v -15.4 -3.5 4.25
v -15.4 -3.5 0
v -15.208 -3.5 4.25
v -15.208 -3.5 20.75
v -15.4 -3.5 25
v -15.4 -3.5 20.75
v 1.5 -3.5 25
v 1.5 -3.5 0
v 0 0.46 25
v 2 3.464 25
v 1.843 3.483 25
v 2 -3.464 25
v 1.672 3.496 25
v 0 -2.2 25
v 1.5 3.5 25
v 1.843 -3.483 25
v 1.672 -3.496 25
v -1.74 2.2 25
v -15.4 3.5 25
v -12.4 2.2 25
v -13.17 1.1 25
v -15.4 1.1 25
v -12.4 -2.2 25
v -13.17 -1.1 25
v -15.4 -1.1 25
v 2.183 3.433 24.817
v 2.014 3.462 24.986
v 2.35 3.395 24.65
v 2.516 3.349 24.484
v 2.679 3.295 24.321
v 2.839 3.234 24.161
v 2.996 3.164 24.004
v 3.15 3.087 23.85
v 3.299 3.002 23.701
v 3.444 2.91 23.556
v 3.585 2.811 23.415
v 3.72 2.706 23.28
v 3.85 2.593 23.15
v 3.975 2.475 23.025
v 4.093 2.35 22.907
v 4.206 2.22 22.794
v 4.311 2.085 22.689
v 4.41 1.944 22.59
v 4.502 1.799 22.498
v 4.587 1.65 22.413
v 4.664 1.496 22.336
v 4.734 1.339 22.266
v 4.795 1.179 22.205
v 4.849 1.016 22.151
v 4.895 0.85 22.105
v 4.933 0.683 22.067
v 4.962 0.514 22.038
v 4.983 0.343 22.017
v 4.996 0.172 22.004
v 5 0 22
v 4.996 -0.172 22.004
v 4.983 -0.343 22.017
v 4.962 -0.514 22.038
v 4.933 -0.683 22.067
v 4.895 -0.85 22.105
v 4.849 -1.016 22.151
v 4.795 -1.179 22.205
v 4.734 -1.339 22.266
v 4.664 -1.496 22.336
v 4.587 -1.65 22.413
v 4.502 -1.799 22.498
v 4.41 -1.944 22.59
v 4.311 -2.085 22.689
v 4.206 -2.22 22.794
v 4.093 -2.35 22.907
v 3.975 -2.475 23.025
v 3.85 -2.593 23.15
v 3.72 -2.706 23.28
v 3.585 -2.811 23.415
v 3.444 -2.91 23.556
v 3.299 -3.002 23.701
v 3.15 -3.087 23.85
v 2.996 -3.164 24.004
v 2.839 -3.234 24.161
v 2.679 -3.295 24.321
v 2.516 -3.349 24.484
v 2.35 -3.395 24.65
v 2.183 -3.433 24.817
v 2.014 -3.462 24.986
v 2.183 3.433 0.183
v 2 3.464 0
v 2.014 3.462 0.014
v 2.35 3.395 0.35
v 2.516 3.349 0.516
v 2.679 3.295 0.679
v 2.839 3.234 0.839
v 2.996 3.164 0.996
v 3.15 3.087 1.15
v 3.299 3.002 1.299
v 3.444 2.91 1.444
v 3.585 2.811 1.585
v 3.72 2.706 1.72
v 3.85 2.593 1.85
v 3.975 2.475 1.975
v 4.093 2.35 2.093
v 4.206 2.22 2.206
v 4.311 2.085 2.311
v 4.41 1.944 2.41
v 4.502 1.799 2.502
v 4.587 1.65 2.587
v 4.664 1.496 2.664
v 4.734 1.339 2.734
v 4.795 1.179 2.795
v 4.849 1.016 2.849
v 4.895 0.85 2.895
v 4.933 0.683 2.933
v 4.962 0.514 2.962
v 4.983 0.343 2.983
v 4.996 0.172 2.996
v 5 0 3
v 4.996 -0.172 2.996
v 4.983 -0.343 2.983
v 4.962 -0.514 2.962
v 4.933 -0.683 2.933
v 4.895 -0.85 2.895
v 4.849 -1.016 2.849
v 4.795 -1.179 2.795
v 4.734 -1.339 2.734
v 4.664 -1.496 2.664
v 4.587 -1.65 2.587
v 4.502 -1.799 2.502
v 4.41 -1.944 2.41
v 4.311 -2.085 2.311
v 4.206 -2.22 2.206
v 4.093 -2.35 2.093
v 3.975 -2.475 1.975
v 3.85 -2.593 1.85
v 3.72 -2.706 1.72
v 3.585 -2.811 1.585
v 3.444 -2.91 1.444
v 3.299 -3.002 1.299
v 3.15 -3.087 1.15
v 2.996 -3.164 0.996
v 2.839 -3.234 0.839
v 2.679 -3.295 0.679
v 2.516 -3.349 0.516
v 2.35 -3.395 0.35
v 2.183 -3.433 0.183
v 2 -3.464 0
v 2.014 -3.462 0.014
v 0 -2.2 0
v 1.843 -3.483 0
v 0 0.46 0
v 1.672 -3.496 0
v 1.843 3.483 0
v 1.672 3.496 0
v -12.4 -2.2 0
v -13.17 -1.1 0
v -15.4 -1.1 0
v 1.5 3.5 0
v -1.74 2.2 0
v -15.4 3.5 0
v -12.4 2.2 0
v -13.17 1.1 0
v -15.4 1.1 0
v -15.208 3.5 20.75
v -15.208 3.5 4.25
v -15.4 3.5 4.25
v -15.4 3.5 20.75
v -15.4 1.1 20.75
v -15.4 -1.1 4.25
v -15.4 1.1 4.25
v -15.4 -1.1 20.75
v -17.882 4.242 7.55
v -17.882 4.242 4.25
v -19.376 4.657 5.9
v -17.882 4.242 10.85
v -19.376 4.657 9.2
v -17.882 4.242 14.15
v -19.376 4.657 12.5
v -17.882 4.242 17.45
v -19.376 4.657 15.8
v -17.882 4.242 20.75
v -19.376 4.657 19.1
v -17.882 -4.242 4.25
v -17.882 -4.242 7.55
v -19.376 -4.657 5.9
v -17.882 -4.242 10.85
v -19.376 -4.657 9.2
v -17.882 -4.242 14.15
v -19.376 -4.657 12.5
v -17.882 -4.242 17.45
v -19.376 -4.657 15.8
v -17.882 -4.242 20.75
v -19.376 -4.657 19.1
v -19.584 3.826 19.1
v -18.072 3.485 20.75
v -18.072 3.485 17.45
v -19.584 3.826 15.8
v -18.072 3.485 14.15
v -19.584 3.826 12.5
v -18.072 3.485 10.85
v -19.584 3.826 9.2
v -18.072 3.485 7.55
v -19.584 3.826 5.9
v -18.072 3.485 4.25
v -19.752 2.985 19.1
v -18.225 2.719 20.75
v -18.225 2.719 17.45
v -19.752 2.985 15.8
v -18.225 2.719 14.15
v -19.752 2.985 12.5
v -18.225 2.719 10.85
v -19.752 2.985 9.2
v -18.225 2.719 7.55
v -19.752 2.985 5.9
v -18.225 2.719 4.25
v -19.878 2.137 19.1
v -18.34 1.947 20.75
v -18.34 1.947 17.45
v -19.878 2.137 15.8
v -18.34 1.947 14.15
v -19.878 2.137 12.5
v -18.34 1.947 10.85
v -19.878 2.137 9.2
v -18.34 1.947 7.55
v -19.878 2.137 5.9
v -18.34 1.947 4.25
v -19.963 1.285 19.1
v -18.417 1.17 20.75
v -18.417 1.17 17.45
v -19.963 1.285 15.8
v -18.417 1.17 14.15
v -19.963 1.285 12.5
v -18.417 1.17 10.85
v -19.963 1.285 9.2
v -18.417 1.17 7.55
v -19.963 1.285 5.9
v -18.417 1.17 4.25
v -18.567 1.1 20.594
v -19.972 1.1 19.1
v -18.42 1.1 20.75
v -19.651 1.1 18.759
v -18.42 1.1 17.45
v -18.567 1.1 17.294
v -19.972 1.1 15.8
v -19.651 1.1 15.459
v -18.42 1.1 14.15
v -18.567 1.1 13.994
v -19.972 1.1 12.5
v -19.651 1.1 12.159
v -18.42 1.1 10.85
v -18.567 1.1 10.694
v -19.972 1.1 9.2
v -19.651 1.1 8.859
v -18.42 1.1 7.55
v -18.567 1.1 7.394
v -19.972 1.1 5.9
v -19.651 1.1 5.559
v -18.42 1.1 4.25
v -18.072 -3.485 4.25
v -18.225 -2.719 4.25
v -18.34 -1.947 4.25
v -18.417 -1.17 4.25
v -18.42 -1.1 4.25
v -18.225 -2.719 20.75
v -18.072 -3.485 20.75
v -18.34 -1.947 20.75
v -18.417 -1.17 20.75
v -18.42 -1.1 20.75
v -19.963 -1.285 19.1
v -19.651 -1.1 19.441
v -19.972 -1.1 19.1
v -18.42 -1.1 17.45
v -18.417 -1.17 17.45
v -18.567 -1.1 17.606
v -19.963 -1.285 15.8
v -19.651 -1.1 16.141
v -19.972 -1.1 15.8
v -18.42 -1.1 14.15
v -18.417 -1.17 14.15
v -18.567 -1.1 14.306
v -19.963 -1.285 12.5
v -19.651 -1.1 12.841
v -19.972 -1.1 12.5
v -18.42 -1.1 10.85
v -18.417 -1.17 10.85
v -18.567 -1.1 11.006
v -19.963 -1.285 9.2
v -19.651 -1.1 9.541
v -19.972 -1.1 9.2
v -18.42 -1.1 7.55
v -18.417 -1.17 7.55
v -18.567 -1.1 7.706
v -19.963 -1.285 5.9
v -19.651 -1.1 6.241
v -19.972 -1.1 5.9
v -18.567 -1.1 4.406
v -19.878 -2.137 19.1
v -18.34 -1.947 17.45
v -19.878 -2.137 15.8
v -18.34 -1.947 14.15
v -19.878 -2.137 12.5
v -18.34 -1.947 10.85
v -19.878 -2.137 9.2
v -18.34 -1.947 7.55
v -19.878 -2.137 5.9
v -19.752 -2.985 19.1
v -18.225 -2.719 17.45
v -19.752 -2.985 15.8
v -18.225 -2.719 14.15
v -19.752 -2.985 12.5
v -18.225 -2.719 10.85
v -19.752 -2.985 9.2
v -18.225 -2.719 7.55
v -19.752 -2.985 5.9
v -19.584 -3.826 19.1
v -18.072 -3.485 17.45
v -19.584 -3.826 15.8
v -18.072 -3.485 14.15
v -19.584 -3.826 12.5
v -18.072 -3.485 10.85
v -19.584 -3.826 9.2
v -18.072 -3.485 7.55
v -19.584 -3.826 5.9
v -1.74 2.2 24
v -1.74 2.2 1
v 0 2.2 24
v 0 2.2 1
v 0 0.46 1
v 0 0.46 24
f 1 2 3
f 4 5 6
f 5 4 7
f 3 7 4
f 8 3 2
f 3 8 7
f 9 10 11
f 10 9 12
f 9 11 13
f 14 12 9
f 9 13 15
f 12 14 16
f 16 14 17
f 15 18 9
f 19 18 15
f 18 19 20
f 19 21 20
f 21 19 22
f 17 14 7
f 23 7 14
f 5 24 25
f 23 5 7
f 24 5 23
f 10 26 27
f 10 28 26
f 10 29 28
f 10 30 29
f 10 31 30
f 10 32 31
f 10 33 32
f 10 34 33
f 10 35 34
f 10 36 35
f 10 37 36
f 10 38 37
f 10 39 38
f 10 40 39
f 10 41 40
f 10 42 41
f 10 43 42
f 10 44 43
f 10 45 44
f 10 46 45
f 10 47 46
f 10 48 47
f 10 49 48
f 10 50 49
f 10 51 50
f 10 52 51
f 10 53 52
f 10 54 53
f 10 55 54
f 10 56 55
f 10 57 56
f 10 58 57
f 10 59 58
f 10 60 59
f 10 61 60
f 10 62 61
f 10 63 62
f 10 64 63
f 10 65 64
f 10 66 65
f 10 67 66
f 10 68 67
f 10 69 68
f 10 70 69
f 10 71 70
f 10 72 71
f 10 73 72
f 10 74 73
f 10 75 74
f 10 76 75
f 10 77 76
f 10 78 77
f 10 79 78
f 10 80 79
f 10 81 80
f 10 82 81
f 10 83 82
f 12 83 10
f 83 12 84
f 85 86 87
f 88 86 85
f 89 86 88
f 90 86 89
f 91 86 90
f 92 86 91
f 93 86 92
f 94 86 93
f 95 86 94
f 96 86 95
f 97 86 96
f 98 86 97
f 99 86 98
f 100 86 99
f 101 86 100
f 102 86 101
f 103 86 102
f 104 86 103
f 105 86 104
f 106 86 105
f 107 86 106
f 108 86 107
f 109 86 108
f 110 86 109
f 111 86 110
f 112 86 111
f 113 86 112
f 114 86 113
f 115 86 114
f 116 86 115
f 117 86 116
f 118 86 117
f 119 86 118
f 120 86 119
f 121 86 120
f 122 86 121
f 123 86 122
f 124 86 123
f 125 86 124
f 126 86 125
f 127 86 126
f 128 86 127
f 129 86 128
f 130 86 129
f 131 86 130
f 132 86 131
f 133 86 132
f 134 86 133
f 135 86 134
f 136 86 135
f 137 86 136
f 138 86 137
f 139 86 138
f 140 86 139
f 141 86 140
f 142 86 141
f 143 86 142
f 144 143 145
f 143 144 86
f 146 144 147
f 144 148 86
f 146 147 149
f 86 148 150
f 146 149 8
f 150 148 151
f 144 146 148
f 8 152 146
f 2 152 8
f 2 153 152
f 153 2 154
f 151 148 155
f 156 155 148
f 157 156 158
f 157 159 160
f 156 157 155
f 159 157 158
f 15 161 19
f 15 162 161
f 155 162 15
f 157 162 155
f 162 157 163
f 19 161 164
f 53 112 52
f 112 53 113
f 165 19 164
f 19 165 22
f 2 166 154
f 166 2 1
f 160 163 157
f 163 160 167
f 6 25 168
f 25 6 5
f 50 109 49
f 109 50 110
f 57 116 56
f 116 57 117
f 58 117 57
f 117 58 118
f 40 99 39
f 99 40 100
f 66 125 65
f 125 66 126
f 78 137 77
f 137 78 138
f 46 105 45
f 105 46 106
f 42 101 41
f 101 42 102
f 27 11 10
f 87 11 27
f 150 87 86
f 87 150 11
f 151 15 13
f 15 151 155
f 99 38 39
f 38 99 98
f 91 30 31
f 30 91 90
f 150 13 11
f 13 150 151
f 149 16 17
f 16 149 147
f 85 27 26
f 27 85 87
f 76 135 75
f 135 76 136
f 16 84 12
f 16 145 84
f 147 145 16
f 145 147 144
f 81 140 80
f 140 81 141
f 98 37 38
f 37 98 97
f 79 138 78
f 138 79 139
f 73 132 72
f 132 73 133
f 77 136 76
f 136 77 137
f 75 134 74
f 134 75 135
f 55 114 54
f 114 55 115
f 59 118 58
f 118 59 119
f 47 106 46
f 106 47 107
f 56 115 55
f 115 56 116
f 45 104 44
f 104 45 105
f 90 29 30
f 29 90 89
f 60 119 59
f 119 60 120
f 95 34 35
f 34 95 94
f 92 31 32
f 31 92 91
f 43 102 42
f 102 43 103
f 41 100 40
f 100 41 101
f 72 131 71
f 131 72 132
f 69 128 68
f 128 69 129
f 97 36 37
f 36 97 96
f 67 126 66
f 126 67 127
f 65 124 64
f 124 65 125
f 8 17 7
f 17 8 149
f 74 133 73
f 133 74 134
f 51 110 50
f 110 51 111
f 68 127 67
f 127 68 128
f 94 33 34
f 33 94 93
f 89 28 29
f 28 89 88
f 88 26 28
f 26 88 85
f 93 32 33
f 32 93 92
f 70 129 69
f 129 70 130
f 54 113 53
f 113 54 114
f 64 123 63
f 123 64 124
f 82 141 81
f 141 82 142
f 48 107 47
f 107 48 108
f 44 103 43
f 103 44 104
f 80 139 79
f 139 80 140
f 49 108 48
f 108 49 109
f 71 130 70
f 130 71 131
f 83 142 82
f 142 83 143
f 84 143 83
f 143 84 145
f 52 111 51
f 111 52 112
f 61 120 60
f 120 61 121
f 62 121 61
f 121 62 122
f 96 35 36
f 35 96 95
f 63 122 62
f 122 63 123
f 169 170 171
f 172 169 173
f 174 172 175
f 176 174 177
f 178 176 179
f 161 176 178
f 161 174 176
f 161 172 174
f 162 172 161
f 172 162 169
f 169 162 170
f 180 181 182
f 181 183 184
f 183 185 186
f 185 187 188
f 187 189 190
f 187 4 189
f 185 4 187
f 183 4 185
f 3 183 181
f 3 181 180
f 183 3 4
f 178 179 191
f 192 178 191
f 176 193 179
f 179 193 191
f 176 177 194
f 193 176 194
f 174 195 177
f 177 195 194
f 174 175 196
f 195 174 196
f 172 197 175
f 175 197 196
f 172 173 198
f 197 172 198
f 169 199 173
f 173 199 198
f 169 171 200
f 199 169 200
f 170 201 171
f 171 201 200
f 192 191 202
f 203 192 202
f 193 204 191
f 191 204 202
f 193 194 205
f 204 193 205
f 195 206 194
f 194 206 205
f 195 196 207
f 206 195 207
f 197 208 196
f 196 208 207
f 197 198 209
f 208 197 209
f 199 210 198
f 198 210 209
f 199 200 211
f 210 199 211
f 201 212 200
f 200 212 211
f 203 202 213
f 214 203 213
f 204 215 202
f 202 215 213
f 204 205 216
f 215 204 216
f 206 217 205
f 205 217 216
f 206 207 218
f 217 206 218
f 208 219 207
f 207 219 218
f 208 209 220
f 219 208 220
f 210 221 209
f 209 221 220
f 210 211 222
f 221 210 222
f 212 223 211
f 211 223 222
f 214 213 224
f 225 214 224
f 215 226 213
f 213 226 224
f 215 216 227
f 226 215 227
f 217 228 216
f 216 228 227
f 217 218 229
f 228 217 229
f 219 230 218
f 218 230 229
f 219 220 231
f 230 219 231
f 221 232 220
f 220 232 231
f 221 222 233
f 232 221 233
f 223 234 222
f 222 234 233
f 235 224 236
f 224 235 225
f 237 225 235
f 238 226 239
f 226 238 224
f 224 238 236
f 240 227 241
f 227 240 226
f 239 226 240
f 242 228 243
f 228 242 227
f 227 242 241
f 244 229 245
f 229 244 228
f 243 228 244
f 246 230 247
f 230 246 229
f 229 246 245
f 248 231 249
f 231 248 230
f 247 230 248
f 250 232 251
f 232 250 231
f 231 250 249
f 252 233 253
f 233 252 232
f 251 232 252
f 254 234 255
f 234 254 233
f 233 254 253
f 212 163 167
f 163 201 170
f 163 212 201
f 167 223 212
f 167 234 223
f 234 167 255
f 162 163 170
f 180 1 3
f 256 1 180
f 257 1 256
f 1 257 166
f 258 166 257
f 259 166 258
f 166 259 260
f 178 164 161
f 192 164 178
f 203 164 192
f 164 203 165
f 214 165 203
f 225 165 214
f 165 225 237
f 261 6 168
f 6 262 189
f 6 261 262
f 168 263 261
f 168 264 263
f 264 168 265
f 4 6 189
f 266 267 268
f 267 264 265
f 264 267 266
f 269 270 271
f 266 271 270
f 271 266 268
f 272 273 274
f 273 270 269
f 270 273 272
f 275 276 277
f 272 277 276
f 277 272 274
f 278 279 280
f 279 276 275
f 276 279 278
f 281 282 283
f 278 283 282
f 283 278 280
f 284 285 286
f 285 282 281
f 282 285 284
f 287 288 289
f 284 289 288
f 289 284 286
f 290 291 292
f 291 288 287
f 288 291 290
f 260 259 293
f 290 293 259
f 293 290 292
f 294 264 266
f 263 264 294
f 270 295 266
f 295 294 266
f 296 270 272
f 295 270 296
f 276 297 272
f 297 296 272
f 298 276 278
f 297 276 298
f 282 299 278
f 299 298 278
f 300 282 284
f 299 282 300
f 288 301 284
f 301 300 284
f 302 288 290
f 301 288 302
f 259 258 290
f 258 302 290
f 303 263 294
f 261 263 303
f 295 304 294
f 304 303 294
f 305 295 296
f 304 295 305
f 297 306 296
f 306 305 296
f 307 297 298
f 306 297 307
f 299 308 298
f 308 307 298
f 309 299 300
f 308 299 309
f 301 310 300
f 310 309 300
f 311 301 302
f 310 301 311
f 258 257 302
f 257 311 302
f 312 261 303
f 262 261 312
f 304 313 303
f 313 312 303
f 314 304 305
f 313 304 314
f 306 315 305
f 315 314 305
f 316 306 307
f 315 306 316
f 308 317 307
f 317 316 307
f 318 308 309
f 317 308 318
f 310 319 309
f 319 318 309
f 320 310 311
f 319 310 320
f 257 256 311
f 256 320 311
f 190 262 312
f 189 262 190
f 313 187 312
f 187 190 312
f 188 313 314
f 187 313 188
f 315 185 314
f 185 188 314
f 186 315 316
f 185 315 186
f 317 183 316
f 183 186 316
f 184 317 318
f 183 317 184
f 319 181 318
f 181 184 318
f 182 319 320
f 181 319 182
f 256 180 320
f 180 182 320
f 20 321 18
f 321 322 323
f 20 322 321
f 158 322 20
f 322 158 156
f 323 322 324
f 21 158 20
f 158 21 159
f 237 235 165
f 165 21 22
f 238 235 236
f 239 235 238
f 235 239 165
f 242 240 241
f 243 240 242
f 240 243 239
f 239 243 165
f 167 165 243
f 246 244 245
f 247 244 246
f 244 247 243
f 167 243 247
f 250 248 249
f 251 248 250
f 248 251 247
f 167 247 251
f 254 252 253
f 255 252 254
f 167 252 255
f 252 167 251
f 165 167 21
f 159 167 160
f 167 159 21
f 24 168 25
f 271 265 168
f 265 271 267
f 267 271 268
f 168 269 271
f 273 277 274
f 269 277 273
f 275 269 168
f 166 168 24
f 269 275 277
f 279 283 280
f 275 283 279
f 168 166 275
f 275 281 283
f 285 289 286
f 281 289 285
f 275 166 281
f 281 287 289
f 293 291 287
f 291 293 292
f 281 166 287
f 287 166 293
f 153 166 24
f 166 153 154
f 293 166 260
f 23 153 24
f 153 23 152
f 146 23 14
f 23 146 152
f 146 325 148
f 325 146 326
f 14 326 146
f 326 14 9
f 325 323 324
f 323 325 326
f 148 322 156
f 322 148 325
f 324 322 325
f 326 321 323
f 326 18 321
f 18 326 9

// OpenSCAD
// file: SideTab.scad
//<params>
left = true;
// oem is 35.5
tabWidth = 39.5;
tabThickness = 8.4;
vaneThickness = 4.45;
vaneTolerance = 0.2;
extraBehindVane = 3;
extraInFrontOfVane = 1.5;
vaneSnapSize = 1.1;
vaneDepth = 19.4;
maxFrontOfVaneToGear = 26.16;
minFrontOfVaneToGear = 23.9;
axleFromFrontOfVane = 6;
gearTolerance = 0.2;
// 0=left, 0.5=center, 1=right (assuming left=true; otherwise, mirrored)
toothPositioning = 0;
toothSpacing = 5;
numberOfTeeth = 5; 
topToothHeight = 6;
bottomToothHeight = 11;
blockerLength = 1;
blockerChamfer = 3;
outerChamfer = 4;
//</params>

module sideTab(
 left=left,
 tabWidth=tabWidth,
 tabThickness=tabThickness,
 vaneThickness=vaneThickness,
 vaneTolerance=vaneTolerance,
 extraBehindVane=extraBehindVane,
 extraInFrontOfVane=extraInFrontOfVane,
 vaneSnapSize=vaneSnapSize,
 vaneDepth=vaneDepth,
 maxFrontOfVaneToGear=maxFrontOfVaneToGear,
 minFrontOfVaneToGear=minFrontOfVaneToGear,
 axleFromFrontOfVane=axleFromFrontOfVane,
 gearTolerance=gearTolerance,
 toothPositioning=toothPositioning,
 toothSpacing=toothSpacing,
 numberOfTeeth=numberOfTeeth,
 topToothHeight=topToothHeight,
 bottomToothHeight=bottomToothHeight,
 blockerLength=blockerLength,
 blockerChamfer=blockerChamfer,
 outerChamfer=outerChamfer,
 )
{
  
  module dummy() {}
  
  nudge = 0.01;
  vaneThickness1 = vaneThickness + 2 * vaneTolerance;
  vaneDepth1 = vaneDepth + 2 * vaneTolerance;
  $fn = 128;
  toothEndAngle = atan2(bottomToothHeight,(minFrontOfVaneToGear-axleFromFrontOfVane));
  toothStartAngle = -atan2(topToothHeight,(minFrontOfVaneToGear-axleFromFrontOfVane));
  
  // 0,0 = front of vane, centered
  
  module outerChamfer() {
      d = outerChamfer;
      x = tabThickness/2+extraInFrontOfVane;
      rotate([90,0,0])
      linear_extrude(center=true,height=tabThickness) polygon([[-100,0],[x-d,0],[x,d],[x,tabWidth-d],[x-d,tabWidth],[-100,tabWidth]]);
  }
  
  module outerProfile() {
      intersection() {
          outerChamfer();
          linear_extrude(height=tabWidth)
              translate([-vaneDepth1,0])
              hull() {
                  translate([-extraBehindVane,-tabThickness/2]) square([1,tabThickness]);
                  translate([vaneDepth1+extraInFrontOfVane,0]) circle(d=tabThickness);
              }
      }
  }
  
  function doubleProfile(polyHalf) = 
      let(n=len(polyHalf))
      concat(polyHalf, [for (i=[0:n-1]) 
          [polyHalf[n-1-i][0],-polyHalf[n-1-i][1]]]);
      
  module toothProfile() {
      short = minFrontOfVaneToGear;
      long = maxFrontOfVaneToGear;
      teethSize = toothSpacing*numberOfTeeth;
      spine = [ [ axleFromFrontOfVane, teethSize ], [ axleFromFrontOfVane, 0 ] ];
      n = 2*numberOfTeeth+1;
      teeth = [ for(i=[0:n-1]) 
           [ i % 2 == 0 ? short : long, teethSize*i/(n-1) ]  ];
      translate([0,toothPositioning*(tabWidth-teethSize)])
      polygon(concat(teeth,spine)); 
  }
  
  module innerProfile() {
      bottom = [
          [ -100,-vaneThickness1/2+vaneSnapSize ], 
          [ -vaneSnapSize*.7, -vaneThickness1/2+vaneSnapSize ],
          [ 0, -vaneThickness1/2 ],
          [ vaneDepth1, -vaneThickness1/2 ],
      ];
      translate([-vaneDepth1,0]) polygon(doubleProfile(bottom));
  }
  
  module blocker() {
      linear_extrude(height=blockerLength) 
      polygon( [[  nudge, vaneThickness1/2-blockerChamfer ],
               [  nudge, vaneThickness1/2+nudge ],
               [ -blockerChamfer, vaneThickness1/2+nudge ]] );
  }
  
  module main() {
      difference() {
          union() {
              outerProfile();
              translate([-axleFromFrontOfVane,0]) 
              rotate([0,0,180+toothStartAngle])
              rotate_extrude(angle=toothEndAngle-toothStartAngle)  translate([nudge-axleFromFrontOfVane,0]) toothProfile();
          }
          translate([0,0,-nudge]) linear_extrude(height=tabWidth+2*nudge) innerProfile();
      }
      blocker();
      translate([0,0,tabWidth-blockerLength]) blocker();
  }
  
  
  if (left) 
      main();
  else
      mirror([1,0,0]) main();
}

sideTab();
// main file
use <SideTab.scad>;

//<params>
left = true;
tabWidth = 25;
tabThickness = 7;
vaneThickness = 4;
vaneTolerance = 0.2;
extraBehindVane = 3;
extraInFrontOfVane = 1.5;
vaneSnapSize = 1.1;
vaneDepth = 12;
maxFrontOfVaneToGear = 20;
minFrontOfVaneToGear = 18.45;
axleFromFrontOfVane = 2.6;
gearTolerance = 0.2;
toothSpacing = 3.3;
numberOfTeeth = 5; 
topToothHeight = 4.4;
bottomToothHeight = 4.4;
blockerLength = 1;
blockerChamfer = 1.75;
toothPositioning = 0.5;
outerChamfer = 3;
//</params>

sideTab(
 left=left,
 tabWidth=tabWidth,
 tabThickness=tabThickness,
 vaneThickness=vaneThickness,
 vaneTolerance=vaneTolerance,
 extraBehindVane=extraBehindVane,
 extraInFrontOfVane=extraInFrontOfVane,
 vaneSnapSize=vaneSnapSize,
 vaneDepth=vaneDepth,
 maxFrontOfVaneToGear=maxFrontOfVaneToGear,
 minFrontOfVaneToGear=minFrontOfVaneToGear,
 axleFromFrontOfVane=axleFromFrontOfVane,
 gearTolerance=gearTolerance,
 toothPositioning=toothPositioning,
 toothSpacing=toothSpacing,
 numberOfTeeth=numberOfTeeth,
 topToothHeight=topToothHeight,
 bottomToothHeight=bottomToothHeight,
 blockerLength=blockerLength,
 blockerChamfer=blockerChamfer,
 outerChamfer=outerChamfer
);
